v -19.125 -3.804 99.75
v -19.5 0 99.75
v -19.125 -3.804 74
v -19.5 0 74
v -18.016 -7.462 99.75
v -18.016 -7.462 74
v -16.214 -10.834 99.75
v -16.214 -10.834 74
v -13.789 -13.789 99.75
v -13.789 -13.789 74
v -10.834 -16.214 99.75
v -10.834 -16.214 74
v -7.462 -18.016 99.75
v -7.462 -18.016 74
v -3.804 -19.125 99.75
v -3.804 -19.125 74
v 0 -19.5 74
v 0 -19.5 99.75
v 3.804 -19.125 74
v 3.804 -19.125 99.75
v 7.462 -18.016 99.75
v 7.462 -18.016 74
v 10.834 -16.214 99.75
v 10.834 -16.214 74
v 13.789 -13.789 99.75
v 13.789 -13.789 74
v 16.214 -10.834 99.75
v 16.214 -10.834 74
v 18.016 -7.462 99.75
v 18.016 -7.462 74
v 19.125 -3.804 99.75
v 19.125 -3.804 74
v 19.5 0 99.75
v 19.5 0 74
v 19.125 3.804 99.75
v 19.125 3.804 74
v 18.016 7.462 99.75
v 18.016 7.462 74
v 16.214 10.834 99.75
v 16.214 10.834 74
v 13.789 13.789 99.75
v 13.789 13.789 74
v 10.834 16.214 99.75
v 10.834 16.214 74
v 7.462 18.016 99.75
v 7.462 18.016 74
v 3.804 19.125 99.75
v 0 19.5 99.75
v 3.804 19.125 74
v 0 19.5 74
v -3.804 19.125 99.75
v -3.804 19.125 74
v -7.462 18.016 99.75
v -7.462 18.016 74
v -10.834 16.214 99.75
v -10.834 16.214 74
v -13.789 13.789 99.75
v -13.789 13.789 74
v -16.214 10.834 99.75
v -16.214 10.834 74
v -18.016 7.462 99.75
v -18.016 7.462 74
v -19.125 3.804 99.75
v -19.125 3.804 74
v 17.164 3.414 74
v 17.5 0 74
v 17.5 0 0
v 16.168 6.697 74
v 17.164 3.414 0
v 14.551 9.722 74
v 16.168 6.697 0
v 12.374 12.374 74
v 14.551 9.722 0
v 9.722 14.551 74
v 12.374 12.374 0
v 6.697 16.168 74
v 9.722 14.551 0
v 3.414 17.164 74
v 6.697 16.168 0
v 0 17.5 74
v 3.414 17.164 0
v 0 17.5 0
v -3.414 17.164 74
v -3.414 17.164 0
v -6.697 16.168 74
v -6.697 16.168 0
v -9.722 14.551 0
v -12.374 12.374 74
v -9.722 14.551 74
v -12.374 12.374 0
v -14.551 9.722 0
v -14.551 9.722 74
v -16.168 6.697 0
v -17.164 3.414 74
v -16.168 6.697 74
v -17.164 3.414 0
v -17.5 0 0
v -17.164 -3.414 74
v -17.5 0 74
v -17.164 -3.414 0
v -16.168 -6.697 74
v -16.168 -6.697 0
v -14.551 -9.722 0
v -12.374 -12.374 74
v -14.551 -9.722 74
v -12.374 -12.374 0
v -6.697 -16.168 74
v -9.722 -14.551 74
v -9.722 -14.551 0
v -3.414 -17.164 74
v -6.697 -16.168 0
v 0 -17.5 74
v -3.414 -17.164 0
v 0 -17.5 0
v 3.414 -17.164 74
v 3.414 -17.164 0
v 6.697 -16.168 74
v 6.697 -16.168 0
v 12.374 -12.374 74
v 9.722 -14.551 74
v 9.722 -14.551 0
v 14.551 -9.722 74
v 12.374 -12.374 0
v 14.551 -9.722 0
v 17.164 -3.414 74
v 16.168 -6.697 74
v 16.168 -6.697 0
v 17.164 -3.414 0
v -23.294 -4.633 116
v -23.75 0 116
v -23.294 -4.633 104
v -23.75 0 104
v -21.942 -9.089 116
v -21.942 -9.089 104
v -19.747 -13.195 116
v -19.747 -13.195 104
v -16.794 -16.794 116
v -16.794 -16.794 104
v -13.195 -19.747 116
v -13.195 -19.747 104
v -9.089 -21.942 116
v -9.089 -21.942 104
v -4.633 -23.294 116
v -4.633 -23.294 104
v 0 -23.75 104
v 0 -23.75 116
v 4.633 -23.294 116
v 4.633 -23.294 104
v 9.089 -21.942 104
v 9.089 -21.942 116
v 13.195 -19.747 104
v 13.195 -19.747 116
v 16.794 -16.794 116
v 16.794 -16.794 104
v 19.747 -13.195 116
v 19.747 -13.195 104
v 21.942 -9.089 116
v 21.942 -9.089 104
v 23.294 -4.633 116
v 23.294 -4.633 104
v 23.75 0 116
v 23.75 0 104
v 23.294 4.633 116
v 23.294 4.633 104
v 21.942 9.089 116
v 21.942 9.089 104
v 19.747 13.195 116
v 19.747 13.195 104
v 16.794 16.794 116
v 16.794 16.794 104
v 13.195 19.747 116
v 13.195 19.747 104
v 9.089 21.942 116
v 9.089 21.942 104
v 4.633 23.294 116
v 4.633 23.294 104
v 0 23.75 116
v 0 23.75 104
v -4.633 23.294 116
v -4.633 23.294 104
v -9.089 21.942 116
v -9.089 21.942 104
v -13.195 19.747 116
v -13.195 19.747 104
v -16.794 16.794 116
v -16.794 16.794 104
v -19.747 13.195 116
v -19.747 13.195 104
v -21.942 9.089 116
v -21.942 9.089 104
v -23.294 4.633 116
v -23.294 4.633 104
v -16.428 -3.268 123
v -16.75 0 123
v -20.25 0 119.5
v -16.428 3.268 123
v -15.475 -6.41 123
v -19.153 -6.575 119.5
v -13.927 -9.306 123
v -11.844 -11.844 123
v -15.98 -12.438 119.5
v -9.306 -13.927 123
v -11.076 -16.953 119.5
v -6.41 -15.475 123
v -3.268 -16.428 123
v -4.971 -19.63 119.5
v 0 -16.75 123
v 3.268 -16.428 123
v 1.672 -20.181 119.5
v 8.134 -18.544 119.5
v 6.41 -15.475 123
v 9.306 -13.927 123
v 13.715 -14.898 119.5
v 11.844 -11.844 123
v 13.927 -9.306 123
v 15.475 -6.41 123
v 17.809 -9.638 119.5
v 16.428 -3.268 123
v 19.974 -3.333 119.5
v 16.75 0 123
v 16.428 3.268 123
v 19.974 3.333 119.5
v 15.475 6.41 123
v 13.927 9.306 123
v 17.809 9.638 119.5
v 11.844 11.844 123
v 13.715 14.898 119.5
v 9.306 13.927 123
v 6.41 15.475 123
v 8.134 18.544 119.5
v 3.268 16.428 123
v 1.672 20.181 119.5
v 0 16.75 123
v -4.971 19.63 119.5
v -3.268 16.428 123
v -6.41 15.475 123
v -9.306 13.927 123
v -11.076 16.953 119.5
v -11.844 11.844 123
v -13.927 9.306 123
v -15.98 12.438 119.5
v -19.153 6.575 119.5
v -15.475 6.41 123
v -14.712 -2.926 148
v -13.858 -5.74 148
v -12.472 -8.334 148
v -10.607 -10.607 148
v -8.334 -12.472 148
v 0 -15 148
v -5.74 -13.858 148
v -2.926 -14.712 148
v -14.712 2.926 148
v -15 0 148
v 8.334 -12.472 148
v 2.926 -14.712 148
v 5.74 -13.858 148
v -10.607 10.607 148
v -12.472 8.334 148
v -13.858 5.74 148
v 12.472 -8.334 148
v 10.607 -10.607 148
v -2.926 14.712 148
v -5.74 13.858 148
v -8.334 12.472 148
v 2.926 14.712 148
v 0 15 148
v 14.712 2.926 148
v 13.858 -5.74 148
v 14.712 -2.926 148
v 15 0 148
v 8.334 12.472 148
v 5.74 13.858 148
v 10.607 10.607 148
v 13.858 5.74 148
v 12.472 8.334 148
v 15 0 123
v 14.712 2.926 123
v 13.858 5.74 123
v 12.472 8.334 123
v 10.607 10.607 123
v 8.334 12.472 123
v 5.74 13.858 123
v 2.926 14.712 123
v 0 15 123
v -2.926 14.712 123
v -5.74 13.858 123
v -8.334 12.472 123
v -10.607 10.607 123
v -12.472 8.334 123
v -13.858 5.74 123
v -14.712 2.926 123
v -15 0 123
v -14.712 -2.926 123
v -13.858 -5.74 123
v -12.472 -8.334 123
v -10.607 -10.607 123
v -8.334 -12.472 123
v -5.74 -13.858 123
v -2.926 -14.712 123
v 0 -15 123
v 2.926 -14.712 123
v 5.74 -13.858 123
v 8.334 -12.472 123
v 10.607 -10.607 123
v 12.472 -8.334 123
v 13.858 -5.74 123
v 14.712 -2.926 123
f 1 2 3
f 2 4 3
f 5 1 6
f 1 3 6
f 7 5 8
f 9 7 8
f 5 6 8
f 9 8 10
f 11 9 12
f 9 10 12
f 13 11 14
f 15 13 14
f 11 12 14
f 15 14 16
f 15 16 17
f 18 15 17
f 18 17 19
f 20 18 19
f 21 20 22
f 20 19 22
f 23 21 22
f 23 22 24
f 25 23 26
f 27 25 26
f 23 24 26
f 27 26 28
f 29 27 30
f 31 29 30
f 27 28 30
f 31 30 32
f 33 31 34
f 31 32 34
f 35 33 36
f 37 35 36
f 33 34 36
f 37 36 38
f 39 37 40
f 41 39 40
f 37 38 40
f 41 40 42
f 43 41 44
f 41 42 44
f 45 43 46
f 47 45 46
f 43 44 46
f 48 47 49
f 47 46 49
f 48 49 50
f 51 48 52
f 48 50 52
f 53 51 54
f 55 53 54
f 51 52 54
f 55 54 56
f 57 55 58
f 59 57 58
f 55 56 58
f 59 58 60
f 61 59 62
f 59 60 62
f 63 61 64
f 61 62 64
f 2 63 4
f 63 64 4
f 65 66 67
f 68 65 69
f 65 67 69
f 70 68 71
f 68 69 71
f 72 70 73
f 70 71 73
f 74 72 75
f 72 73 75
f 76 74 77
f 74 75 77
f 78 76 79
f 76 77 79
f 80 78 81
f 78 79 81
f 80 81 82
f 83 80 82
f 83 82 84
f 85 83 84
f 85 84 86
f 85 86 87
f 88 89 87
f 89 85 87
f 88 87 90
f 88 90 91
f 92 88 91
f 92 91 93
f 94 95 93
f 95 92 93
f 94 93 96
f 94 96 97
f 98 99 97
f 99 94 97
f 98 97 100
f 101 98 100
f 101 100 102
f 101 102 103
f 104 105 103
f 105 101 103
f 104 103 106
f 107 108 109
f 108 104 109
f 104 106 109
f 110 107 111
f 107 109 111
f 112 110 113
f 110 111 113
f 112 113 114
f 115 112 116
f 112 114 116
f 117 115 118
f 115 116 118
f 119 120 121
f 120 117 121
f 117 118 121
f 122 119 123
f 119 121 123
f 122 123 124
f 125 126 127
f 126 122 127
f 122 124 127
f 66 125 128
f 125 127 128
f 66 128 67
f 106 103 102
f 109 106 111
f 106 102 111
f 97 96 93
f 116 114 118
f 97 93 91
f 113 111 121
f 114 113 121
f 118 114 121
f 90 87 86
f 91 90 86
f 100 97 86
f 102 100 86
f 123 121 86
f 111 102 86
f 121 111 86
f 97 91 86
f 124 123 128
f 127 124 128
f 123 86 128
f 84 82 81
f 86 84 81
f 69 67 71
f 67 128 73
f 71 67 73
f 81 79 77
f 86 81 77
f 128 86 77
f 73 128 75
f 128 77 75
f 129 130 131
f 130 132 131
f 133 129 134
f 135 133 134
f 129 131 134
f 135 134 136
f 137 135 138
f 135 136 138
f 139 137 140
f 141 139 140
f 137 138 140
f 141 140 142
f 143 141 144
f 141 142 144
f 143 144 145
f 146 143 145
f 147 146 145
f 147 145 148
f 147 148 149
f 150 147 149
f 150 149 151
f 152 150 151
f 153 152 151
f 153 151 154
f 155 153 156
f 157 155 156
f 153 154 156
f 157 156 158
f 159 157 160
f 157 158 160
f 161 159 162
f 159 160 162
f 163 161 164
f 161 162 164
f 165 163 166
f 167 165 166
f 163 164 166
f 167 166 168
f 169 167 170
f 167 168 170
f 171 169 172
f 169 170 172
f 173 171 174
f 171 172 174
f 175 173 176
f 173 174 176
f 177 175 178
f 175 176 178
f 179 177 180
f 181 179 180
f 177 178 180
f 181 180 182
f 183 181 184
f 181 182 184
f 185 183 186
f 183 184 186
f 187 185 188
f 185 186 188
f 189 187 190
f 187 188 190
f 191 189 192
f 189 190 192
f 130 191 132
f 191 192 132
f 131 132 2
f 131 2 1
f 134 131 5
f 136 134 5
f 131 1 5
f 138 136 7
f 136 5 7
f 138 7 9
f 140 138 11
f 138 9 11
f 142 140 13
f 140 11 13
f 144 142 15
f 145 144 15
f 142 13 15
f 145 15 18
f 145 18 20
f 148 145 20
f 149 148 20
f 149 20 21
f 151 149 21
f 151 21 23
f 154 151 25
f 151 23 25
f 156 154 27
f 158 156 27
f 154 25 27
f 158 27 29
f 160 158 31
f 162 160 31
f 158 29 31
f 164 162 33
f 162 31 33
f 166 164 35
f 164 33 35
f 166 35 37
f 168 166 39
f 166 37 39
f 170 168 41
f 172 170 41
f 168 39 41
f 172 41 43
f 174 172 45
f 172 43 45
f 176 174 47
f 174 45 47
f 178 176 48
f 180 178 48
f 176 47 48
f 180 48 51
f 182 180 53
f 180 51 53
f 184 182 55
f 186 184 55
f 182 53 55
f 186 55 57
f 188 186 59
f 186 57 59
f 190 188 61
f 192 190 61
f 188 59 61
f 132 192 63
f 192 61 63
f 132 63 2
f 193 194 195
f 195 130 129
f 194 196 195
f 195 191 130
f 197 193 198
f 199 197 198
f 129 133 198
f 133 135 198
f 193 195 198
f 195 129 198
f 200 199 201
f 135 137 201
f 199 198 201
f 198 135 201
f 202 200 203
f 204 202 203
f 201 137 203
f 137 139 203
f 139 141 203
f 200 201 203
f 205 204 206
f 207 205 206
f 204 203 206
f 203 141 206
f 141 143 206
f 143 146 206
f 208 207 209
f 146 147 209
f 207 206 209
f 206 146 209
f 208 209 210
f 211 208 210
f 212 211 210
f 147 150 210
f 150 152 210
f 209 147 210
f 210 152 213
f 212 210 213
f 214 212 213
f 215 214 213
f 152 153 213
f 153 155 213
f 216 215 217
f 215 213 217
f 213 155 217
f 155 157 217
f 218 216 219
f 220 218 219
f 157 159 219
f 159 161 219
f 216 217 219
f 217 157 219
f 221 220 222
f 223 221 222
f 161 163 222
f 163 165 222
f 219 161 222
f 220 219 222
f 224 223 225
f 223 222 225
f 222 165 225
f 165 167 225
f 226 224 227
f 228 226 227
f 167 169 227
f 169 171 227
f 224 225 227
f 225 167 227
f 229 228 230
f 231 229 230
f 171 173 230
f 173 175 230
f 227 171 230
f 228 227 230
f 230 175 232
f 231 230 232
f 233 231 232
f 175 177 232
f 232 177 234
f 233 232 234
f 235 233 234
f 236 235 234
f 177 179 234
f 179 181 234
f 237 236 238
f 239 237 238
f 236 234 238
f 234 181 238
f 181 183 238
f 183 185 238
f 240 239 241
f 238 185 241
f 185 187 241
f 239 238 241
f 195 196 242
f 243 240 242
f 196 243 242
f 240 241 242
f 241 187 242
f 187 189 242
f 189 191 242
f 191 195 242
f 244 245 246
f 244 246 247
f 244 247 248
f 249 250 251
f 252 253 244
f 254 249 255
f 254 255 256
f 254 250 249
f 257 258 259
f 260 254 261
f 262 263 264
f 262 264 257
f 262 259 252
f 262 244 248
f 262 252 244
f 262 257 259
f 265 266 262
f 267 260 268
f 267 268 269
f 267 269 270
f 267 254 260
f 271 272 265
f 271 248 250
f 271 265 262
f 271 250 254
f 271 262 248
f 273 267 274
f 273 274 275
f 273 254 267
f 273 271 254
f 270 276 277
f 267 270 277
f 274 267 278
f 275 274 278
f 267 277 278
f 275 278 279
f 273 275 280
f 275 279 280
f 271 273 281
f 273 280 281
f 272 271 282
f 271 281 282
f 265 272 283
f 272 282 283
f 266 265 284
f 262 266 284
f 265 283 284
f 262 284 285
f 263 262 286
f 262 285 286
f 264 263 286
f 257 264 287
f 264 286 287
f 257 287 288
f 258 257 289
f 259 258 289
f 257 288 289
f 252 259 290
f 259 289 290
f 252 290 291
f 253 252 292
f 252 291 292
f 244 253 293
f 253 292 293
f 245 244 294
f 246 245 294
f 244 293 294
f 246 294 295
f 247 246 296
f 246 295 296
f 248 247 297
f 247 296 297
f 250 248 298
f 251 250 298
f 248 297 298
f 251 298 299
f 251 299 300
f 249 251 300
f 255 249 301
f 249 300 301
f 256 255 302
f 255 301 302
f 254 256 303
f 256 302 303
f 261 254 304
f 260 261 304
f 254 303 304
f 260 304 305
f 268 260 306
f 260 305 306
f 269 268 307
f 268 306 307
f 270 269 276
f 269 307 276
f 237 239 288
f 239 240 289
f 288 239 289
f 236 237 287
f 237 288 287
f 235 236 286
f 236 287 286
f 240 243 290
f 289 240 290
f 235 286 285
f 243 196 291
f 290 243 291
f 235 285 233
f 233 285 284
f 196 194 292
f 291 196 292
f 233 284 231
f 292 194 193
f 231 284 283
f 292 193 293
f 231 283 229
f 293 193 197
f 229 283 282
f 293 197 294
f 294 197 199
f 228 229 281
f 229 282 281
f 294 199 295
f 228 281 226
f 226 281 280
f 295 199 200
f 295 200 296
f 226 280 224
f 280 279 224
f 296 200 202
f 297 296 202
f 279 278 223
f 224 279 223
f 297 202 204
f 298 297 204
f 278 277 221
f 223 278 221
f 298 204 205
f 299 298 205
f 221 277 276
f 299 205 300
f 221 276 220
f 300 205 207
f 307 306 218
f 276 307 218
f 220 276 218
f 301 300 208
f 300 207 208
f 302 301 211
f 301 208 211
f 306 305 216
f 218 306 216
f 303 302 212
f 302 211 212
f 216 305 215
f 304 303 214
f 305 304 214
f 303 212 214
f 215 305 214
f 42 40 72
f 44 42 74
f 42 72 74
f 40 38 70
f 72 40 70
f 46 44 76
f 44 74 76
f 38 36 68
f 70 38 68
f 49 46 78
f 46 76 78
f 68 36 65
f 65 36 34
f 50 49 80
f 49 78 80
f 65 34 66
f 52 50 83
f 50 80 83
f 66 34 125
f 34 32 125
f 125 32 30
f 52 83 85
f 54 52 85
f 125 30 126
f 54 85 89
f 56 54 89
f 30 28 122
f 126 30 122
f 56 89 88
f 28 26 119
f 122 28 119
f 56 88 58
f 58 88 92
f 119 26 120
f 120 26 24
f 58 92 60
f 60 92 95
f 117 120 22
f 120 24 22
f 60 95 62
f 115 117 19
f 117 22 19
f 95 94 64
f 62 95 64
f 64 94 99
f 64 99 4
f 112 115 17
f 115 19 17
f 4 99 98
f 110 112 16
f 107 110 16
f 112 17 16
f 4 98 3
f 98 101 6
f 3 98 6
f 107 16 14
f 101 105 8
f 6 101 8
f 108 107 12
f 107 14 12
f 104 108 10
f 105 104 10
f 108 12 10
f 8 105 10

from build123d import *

# Parameters (mm, degrees)
F0_R     = 17.5
F1_DEPTH = 75
F4_R     = 15
F5_DEPTH = 25


with BuildPart() as f1:
    # F0 (on Top) → F1 (new body)
    with BuildSketch(Plane.XY):
        Circle(F0_R)
    extrude(amount=F1_DEPTH)

    # F2 (on Front) → F3 (revolve)
    with BuildSketch(Plane.XZ):
        Polygon((-19.5, 74), (0, 74), (0, 123), (-16.75, 123), (-23.75, 116), (-23.75, 104), (-19.5, 99.75), align=None)
    revolve(axis=Axis((0, 0, 40.698601), (0, 0, 1)))

    # F4 (on face) → F5 (join)
    with BuildSketch(Plane.XY.offset(123)):
        Circle(F4_R)
    extrude(amount=F5_DEPTH)


solid = f1.part
